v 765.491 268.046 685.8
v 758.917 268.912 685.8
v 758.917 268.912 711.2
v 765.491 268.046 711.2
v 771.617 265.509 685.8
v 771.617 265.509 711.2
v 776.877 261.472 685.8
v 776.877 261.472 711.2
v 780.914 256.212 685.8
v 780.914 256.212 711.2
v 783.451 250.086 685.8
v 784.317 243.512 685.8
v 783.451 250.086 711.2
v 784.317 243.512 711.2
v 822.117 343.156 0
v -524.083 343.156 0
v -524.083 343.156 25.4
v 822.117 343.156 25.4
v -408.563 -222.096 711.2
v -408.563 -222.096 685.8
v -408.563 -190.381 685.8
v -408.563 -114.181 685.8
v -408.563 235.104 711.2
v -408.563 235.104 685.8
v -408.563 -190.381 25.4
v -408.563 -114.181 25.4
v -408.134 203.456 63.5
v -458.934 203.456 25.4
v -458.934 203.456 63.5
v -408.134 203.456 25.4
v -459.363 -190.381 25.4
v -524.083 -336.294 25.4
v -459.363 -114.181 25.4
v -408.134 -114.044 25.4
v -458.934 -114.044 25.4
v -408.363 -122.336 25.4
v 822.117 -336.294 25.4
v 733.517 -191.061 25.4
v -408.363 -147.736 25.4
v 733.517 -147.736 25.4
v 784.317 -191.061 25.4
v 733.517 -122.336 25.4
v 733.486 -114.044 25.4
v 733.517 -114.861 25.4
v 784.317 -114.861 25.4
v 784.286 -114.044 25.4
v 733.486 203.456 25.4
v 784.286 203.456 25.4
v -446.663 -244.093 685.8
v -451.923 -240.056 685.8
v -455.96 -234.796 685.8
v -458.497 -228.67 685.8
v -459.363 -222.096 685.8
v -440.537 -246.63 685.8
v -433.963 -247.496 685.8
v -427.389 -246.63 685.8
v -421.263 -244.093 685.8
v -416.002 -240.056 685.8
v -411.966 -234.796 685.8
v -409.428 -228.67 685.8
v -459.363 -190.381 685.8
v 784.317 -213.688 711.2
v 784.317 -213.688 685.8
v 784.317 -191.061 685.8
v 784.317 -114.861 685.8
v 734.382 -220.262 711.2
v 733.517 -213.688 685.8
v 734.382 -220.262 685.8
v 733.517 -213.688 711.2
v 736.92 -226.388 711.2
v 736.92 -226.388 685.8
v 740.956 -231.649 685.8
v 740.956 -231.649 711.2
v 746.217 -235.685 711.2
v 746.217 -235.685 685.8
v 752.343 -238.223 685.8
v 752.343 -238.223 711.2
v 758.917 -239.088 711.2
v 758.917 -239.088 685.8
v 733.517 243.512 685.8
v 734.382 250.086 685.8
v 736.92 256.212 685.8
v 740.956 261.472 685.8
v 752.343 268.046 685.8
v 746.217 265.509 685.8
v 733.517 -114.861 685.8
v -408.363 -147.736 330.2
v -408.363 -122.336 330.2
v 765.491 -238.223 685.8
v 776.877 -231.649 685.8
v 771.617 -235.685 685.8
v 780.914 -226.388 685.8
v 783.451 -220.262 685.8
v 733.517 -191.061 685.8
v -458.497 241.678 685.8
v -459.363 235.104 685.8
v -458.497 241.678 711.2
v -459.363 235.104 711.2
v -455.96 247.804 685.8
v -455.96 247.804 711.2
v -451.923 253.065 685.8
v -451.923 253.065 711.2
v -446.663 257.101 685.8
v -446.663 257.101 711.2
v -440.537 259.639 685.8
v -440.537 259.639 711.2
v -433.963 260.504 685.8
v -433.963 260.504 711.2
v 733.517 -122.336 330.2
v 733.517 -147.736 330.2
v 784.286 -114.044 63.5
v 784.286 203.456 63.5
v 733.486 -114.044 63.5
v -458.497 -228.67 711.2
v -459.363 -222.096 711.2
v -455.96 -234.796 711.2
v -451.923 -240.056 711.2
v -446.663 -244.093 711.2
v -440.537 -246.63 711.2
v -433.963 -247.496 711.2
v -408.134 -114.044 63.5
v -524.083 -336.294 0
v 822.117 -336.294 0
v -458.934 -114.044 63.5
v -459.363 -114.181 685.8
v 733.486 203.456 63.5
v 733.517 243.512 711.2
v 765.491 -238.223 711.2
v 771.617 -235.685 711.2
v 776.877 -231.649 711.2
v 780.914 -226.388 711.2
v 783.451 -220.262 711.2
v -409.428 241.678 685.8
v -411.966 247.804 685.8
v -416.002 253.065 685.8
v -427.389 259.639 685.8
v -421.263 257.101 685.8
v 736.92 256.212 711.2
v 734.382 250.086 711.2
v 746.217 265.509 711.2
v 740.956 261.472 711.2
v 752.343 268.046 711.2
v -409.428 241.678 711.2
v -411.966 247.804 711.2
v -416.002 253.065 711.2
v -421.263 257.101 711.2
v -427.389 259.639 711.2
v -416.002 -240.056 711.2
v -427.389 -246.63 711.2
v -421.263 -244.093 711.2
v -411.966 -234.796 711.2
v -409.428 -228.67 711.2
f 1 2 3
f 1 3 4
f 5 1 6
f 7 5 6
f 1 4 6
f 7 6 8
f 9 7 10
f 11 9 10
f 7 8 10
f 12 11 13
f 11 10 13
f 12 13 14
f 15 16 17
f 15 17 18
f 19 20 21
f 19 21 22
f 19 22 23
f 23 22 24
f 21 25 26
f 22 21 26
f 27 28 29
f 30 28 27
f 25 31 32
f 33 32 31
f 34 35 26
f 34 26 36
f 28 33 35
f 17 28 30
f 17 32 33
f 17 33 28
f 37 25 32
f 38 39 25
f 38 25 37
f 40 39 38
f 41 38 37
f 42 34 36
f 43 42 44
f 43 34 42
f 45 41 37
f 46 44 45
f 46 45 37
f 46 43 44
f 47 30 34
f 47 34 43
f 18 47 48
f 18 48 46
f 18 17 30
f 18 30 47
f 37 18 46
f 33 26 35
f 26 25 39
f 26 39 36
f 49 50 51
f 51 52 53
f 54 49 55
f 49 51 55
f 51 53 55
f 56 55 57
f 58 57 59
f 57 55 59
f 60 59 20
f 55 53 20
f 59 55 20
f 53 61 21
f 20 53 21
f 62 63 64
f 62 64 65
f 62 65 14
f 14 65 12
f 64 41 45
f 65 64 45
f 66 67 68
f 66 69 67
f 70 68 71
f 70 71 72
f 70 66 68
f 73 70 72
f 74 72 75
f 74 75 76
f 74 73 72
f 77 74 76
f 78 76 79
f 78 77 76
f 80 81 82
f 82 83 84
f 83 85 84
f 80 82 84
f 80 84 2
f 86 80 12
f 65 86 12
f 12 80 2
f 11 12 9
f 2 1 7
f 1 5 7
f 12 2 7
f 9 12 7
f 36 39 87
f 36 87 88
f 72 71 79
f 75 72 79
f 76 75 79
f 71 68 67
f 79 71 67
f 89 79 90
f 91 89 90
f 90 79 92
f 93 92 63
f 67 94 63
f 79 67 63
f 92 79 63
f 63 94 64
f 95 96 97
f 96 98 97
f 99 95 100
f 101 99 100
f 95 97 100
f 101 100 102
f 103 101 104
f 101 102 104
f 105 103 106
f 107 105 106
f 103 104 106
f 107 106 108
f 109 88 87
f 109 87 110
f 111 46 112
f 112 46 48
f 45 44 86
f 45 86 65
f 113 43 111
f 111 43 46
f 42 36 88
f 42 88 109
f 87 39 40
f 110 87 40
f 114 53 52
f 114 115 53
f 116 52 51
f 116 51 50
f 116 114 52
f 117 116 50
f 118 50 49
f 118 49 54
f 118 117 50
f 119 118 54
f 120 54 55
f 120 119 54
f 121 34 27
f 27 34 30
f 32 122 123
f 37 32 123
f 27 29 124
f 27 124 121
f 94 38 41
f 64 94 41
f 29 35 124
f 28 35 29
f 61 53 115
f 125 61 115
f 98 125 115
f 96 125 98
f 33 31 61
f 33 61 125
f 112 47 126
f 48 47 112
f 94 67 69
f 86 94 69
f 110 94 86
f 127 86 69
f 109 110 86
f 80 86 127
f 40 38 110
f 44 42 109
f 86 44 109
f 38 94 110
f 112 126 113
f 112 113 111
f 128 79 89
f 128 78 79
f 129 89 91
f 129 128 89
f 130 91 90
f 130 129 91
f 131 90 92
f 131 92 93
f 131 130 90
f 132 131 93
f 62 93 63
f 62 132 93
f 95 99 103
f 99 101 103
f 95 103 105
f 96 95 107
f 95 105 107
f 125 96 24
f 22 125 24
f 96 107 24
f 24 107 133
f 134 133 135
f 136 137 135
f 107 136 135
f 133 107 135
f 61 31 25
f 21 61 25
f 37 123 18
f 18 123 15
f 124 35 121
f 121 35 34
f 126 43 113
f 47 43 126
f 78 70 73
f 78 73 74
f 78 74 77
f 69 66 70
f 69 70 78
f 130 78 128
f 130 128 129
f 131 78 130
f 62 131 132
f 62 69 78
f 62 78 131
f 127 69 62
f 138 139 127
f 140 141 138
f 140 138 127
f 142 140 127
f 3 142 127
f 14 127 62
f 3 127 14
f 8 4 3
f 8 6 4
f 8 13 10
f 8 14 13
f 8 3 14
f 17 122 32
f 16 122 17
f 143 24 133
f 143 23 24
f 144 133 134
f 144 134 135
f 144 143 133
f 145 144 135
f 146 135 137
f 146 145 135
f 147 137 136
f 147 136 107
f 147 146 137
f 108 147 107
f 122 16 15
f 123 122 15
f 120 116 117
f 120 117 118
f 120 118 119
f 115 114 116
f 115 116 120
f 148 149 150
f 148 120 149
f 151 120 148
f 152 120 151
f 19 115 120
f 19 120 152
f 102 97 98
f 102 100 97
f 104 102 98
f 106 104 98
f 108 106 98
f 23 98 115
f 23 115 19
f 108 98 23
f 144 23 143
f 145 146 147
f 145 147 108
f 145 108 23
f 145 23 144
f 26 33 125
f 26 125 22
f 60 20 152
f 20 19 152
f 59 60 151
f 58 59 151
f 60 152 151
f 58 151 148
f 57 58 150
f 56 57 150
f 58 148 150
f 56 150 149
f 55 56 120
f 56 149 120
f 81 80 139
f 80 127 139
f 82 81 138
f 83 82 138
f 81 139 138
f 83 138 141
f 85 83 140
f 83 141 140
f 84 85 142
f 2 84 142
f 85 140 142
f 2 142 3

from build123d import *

# Parameters (mm, degrees)
F0_W      = 1346.2
F0_H      = 679.45
F1_DEPTH  = 25.4
F3_W      = 50.8
F3_H      = 317.5
F4_W      = 50.8
F4_H      = 317.5
F5_DEPTH  = 38.1
F7_W      = 50.8
F7_H      = 76.2
F6_W      = 50.8
F6_H      = 76.2
F8_DEPTH  = 660.4
F10_W     = 50.8
F10_H     = 508
F9_W      = 50.8
F9_H      = 508
F11_DEPTH = 25.4
F12_R     = 25.39999
F13_R     = 25.4
F14_W     = 1143.3658423165
F14_H     = 25.4
F15_DEPTH = 304.8


# Not quite as in the source:
# - a fillet or chamfer is up to 0.001 mm smaller than in the source, because OpenCascade refuses the exact size


with BuildPart() as f1:
    # F0 (on Top) → F1 (new body)
    with BuildSketch(Plane.XY):
        with Locations((149.0168645364, 3.430750221)):
            Rectangle(F0_W, F0_H)
    extrude(amount=F1_DEPTH)

    # F3 (on face) + F4 (on face) → F5 (join)
    with BuildSketch(Plane.XY.offset(25.4)):
        with Locations((-433.5340384189, 44.705750221)):
            Rectangle(F3_W, F3_H)
    with BuildSketch(Plane.XY.offset(25.4)):
        with Locations((758.8858046625, 44.705750221)):
            Rectangle(F4_W, F4_H)
    extrude(amount=F5_DEPTH)

    # F7 (on face) + F6 (on face) → F8 (join)
    with BuildSketch(Plane.XY.offset(25.4)):
        with Locations((-433.9627325535, -152.2812862285)):
            Rectangle(F7_W, F7_H)
    with BuildSketch(Plane.XY.offset(25.4)):
        with Locations((758.9168250561, -152.9612190686)):
            Rectangle(F6_W, F6_H)
    extrude(amount=F8_DEPTH)

    # F10 (on face) + F9 (on face) → F11 (join)
    with BuildSketch(Plane.XY.offset(685.8)):
        with Locations((758.9168250561, 14.9119266272)):
            Rectangle(F10_W, F10_H)
    with BuildSketch(Plane.XY.offset(685.8)):
        with Locations((-433.9627325535, 6.5043487549)):
            Rectangle(F9_W, F9_H)
    extrude(amount=F11_DEPTH)

    # F12 (radius 25.4 in the source; OpenCascade refuses exactly that, so slightly less here)
    f12_edges = [f1.edges().sort_by_distance(p)[0] for p in [
        (-459.362733, 260.504349, 698.5),
        (-408.562733, 260.504349, 698.5),
        (733.516825, 268.911927, 698.5),
        (784.316825, 268.911927, 698.5),
        (-459.362733, -247.495651, 698.5),
        (-408.562733, -247.495651, 698.5),
        (733.516825, -239.088073, 698.5),
    ]]
    fillet(f12_edges, radius=F12_R)

    # F13
    f13_edges = [f1.edges().sort_by_distance(p)[0] for p in [
        (784.316825, -239.088073, 698.5),
    ]]
    fillet(f13_edges, radius=F13_R)

    # F14 (on face) → F15 (join)
    with BuildSketch(Plane.XY.offset(25.4)):
        with Locations((163.3197753559, -135.036409986)):
            Rectangle(F14_W, F14_H)
    extrude(amount=F15_DEPTH)


solid = f1.part
